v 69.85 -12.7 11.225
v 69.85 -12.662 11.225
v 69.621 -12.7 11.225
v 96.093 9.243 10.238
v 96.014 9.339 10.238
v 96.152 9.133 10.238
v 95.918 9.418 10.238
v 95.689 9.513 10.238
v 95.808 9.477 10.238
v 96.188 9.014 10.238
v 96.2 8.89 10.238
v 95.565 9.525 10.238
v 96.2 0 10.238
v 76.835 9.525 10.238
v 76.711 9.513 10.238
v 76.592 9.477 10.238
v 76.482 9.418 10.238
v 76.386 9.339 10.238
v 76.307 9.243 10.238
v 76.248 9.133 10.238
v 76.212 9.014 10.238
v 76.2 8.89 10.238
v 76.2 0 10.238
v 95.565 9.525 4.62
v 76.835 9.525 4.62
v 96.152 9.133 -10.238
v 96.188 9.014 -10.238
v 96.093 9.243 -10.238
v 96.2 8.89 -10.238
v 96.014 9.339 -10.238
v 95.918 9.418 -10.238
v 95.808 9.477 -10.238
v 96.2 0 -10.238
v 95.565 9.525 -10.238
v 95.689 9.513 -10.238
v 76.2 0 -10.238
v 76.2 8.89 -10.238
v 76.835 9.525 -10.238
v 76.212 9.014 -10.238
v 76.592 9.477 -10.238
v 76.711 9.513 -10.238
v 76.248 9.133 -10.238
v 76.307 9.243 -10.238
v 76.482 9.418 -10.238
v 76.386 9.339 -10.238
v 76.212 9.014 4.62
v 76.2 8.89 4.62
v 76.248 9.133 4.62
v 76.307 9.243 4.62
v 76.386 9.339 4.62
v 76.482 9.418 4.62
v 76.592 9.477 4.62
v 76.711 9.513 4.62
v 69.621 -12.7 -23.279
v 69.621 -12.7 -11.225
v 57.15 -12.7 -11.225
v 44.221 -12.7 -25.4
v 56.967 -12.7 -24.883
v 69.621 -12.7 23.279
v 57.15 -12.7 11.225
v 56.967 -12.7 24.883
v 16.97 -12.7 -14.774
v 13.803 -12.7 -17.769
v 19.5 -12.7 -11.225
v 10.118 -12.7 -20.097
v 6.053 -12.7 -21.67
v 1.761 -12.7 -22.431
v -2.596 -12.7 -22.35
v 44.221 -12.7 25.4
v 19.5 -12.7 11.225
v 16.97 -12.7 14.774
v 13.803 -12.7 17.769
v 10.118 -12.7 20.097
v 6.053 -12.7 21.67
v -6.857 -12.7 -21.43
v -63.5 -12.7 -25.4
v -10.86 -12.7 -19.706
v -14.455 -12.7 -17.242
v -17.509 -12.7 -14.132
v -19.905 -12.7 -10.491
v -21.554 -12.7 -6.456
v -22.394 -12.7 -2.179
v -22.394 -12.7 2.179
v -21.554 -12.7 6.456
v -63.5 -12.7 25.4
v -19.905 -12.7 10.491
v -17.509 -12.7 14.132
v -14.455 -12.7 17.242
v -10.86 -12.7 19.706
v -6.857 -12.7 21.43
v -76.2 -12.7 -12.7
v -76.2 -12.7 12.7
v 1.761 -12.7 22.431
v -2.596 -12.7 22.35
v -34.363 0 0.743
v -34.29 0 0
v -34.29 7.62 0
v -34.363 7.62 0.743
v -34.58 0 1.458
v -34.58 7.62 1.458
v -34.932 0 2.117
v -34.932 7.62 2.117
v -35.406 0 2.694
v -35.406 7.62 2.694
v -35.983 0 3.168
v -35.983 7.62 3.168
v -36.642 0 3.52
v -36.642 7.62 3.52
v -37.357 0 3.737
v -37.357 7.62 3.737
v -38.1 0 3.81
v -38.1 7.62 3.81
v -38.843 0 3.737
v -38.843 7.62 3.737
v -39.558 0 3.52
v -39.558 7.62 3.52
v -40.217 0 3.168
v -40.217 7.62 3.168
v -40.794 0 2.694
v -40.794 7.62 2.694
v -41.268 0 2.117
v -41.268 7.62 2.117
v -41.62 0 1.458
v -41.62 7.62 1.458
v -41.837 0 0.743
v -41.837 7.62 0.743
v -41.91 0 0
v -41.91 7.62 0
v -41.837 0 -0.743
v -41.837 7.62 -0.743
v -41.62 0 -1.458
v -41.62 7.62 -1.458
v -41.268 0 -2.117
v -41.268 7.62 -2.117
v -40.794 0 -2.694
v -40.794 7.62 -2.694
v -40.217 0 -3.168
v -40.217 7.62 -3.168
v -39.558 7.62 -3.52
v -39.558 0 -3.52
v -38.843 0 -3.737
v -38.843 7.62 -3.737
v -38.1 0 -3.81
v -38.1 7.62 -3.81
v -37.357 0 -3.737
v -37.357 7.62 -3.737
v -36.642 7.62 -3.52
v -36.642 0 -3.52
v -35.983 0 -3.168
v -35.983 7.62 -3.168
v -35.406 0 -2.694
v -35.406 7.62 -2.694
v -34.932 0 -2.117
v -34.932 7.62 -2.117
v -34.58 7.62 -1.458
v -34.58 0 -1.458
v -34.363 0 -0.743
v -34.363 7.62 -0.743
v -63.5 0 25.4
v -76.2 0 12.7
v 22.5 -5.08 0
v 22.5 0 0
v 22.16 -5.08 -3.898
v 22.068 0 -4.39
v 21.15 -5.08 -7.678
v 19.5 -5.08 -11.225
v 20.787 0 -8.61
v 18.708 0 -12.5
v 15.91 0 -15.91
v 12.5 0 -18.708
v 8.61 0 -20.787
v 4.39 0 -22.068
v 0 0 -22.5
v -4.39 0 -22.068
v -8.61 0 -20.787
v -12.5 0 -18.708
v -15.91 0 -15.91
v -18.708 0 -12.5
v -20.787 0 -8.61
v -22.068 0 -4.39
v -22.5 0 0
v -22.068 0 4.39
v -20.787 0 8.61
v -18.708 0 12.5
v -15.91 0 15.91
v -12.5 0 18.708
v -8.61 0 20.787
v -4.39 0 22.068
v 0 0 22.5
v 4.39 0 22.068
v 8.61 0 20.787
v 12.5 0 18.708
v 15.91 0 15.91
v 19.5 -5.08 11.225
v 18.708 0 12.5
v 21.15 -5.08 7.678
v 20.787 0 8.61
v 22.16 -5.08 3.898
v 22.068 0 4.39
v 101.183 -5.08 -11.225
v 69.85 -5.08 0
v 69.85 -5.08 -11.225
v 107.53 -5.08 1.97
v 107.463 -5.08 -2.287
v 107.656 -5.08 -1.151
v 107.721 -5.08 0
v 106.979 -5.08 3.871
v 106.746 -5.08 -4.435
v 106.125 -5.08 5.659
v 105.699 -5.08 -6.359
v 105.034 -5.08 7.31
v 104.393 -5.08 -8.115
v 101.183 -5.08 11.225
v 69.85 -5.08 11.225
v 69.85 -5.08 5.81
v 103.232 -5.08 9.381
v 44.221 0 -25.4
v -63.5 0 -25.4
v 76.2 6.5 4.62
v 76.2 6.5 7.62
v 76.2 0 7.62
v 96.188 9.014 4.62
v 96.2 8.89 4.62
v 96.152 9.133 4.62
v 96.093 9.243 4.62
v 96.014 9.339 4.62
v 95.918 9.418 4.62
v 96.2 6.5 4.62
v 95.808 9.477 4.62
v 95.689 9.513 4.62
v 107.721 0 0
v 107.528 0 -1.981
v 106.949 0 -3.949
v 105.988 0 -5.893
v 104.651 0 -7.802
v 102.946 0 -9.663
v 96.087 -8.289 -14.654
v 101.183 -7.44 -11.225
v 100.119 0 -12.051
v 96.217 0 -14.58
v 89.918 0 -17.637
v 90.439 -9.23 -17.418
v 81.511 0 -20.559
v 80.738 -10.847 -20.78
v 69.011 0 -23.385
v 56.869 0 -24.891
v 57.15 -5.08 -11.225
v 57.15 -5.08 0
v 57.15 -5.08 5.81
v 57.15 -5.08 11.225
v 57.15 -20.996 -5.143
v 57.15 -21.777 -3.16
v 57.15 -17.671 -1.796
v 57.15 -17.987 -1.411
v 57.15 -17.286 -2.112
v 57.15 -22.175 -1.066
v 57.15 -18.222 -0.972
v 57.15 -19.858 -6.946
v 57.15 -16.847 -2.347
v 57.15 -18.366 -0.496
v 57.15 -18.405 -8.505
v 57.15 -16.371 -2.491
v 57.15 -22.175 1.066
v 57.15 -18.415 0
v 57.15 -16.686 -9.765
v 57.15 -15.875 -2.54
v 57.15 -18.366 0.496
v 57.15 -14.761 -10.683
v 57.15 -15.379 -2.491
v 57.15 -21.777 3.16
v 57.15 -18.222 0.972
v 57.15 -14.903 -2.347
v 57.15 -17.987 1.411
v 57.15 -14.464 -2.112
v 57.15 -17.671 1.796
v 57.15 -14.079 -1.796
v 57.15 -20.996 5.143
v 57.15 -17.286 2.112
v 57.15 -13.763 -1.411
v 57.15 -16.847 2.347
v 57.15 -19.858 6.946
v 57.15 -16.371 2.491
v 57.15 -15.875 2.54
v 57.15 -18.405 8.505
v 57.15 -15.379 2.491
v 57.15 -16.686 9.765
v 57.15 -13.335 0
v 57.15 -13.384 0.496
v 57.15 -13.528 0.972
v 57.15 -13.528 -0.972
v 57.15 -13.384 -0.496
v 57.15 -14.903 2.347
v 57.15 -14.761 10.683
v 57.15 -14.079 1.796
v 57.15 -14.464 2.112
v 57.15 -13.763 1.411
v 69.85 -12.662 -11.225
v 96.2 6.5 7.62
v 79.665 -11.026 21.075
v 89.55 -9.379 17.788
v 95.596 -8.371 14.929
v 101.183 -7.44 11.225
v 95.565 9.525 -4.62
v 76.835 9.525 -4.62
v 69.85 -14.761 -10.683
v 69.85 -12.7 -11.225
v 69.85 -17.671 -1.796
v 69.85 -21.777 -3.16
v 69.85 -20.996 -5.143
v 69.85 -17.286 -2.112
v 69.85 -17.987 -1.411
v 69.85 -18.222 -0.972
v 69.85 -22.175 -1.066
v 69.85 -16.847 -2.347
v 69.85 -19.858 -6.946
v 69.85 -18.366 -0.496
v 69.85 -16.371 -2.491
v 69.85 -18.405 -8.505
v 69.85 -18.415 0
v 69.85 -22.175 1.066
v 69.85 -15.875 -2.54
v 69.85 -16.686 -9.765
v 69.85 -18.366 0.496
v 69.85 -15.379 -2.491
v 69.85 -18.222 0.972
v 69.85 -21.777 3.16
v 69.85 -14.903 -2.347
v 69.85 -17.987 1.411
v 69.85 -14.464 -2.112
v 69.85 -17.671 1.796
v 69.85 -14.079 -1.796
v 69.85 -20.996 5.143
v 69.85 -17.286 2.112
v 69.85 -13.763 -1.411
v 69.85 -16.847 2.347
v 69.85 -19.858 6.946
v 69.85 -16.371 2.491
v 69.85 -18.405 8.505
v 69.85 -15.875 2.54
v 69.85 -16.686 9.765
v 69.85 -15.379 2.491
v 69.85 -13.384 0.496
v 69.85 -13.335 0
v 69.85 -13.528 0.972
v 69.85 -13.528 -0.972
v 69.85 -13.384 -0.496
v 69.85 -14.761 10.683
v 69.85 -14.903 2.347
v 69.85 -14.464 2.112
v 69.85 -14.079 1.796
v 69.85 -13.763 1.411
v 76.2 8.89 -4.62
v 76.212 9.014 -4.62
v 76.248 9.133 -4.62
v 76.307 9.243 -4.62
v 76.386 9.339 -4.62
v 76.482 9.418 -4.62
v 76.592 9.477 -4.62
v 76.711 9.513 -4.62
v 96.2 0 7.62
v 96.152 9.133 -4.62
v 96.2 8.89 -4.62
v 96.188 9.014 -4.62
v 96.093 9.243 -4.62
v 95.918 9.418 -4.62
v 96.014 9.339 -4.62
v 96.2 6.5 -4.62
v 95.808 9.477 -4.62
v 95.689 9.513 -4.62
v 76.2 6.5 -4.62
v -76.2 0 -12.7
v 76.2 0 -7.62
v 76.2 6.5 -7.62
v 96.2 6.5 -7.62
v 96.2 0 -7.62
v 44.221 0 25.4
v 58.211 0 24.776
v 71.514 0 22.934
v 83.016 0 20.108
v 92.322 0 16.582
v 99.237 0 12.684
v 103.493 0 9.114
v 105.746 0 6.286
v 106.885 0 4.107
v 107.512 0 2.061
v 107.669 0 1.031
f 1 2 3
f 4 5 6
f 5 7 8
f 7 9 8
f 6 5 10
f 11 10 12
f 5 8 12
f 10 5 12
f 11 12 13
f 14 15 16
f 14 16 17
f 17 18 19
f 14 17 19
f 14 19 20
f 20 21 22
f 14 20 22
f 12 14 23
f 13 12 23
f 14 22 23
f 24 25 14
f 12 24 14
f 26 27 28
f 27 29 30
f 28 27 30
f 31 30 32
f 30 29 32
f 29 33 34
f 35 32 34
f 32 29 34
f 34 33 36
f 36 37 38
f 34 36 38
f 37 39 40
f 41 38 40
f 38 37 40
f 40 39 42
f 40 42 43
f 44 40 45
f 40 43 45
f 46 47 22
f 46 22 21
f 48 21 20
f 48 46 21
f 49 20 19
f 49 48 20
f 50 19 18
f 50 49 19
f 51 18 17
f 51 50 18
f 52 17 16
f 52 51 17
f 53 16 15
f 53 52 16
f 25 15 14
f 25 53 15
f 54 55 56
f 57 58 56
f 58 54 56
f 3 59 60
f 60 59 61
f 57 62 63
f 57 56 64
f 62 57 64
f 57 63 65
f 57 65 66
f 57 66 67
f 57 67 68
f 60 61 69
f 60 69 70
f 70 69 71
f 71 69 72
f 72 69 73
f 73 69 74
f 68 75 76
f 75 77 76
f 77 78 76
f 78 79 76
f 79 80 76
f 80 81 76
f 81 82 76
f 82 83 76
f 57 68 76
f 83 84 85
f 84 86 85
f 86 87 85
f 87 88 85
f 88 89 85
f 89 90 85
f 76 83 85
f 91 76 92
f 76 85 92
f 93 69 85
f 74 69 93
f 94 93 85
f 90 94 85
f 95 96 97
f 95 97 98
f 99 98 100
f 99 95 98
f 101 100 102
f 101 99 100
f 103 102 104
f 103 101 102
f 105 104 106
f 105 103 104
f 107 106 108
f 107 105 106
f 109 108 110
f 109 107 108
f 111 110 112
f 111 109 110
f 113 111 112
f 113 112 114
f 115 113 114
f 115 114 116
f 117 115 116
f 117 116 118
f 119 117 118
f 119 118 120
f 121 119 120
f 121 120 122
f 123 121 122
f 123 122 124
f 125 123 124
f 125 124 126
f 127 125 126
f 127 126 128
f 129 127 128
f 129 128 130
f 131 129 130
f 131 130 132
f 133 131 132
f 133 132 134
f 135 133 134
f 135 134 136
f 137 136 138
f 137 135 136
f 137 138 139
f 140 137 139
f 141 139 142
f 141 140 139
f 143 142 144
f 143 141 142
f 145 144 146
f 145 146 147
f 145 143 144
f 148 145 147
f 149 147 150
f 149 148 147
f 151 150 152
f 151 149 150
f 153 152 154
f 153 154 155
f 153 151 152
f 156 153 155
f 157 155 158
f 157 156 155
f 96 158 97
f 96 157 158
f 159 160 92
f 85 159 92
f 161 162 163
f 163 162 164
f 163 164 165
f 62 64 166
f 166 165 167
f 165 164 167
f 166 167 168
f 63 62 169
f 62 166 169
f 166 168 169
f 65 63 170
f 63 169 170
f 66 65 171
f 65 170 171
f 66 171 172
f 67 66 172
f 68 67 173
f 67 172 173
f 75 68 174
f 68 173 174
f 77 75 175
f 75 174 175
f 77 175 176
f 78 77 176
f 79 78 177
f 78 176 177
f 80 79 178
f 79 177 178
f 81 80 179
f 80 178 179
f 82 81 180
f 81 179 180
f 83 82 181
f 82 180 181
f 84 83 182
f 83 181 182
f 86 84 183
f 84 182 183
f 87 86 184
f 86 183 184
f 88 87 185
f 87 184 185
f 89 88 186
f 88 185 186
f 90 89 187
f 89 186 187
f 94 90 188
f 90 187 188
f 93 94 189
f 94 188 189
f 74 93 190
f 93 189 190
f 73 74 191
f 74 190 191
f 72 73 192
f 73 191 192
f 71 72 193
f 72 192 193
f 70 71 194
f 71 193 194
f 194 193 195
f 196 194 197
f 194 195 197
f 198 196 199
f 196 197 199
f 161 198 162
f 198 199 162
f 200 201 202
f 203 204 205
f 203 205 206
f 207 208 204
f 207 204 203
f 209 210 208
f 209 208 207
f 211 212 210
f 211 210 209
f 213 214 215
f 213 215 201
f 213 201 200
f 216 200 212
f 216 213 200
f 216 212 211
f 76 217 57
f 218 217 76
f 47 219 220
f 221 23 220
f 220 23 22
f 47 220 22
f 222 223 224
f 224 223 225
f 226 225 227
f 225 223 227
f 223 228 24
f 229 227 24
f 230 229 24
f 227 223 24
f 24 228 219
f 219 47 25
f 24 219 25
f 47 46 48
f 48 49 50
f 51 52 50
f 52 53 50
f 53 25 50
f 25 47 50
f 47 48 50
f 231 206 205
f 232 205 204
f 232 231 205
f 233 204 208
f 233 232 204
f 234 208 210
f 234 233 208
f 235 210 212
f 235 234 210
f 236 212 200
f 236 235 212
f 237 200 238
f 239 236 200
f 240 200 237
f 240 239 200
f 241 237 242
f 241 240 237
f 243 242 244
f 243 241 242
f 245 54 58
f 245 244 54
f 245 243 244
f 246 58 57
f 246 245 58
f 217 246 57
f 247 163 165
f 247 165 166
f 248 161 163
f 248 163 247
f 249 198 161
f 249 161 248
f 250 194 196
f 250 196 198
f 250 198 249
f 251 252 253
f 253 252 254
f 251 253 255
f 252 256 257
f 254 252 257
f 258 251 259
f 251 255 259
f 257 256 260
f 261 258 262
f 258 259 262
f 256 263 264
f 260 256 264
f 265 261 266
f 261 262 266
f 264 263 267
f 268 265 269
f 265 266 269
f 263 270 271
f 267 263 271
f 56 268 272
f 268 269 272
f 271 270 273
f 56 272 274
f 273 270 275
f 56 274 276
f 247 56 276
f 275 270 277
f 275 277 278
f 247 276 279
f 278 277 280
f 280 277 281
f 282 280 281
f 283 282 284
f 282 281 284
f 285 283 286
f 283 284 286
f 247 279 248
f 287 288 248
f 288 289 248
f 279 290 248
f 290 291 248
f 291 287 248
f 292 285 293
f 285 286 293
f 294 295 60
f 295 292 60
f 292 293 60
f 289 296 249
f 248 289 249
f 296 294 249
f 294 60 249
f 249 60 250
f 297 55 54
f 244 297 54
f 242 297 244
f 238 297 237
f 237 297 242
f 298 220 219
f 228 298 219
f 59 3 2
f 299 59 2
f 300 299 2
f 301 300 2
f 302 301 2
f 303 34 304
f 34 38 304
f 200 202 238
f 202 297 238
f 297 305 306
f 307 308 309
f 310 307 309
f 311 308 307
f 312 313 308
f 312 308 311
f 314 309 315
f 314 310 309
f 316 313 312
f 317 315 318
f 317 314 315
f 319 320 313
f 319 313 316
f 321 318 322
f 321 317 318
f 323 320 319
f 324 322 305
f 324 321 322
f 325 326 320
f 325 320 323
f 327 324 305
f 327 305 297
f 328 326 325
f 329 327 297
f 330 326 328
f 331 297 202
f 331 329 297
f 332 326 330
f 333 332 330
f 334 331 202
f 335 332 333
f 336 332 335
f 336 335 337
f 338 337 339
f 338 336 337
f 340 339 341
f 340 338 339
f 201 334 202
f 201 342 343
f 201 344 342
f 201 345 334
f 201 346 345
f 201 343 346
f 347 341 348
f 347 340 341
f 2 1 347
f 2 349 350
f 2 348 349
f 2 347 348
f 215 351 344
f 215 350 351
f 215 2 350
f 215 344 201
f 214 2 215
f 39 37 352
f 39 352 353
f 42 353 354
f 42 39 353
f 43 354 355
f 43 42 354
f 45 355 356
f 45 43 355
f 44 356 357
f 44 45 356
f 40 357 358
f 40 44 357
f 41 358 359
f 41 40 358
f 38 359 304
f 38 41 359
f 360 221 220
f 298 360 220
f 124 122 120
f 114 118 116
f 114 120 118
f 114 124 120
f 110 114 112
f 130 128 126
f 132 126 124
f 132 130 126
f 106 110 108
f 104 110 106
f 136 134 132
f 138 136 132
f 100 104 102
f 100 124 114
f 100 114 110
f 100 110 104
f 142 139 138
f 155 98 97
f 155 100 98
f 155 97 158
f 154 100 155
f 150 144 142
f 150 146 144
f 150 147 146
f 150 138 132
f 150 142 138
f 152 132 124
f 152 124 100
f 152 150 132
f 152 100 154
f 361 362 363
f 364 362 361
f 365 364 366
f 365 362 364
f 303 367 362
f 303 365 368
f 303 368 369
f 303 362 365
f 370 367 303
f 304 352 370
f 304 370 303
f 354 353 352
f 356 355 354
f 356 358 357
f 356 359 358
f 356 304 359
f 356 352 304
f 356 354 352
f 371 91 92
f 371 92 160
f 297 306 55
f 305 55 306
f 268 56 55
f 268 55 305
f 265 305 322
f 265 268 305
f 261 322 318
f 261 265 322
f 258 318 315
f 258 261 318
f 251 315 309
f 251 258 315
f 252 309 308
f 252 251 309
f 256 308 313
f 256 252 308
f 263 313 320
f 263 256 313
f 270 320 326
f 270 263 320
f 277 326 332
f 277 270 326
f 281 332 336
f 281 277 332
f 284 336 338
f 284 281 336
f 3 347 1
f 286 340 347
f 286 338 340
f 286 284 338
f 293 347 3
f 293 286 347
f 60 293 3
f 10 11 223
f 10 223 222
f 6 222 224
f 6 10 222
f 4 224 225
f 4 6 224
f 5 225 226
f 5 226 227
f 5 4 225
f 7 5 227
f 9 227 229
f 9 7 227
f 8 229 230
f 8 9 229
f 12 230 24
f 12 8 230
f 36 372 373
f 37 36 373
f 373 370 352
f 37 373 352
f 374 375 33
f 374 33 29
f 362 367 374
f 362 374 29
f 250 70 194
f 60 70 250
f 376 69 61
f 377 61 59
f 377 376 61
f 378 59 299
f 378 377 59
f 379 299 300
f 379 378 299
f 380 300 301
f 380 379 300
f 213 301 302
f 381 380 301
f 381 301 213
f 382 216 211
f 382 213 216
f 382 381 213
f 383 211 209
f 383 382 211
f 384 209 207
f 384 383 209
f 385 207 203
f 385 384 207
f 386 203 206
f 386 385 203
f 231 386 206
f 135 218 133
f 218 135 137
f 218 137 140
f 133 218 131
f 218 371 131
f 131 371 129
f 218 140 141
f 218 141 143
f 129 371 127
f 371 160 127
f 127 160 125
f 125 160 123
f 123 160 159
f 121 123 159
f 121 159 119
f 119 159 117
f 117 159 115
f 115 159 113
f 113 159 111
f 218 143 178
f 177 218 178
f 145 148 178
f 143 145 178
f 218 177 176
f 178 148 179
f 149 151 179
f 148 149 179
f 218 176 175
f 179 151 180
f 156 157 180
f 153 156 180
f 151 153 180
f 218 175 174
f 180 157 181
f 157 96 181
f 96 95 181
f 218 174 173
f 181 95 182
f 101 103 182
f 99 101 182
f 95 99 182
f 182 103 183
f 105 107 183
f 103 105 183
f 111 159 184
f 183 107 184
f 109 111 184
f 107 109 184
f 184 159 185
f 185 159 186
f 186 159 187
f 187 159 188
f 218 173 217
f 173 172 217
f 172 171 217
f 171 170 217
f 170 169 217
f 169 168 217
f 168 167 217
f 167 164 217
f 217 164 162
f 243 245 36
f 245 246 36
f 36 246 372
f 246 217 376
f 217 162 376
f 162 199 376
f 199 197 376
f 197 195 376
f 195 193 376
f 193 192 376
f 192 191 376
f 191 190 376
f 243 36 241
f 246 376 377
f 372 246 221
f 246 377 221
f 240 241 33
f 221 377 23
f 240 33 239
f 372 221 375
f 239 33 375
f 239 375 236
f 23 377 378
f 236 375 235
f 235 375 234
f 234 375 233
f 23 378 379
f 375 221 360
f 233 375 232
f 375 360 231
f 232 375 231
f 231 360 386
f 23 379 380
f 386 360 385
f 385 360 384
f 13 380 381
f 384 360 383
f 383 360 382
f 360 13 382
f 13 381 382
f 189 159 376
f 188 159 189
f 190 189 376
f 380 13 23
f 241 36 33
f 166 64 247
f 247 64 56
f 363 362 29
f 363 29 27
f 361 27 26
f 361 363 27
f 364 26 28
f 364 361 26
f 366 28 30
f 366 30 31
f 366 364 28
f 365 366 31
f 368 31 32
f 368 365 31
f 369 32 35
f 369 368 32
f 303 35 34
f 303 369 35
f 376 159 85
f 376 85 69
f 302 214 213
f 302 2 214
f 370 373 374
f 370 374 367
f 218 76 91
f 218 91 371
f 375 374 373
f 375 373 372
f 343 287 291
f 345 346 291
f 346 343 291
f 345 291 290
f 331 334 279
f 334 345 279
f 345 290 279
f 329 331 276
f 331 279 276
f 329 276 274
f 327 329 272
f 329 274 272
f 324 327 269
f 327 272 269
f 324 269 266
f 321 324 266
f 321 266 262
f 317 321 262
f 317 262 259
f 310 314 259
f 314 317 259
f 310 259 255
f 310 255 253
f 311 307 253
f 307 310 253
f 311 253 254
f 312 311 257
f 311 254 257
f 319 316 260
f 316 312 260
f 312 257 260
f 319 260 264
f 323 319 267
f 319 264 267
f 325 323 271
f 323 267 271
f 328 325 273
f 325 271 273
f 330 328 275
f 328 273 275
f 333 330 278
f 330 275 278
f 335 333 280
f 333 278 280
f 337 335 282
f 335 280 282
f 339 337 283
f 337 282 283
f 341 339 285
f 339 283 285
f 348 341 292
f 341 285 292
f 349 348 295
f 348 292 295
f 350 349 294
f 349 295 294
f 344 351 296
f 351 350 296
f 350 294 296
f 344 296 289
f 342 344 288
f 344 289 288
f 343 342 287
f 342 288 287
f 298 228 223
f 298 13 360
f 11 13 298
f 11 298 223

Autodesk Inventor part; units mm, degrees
ref_plane "XZ Plane" through (0, 0, 0) normal (0, 1, 0) x (-1, 0, 0)
sketch "Sketch1" plane through (0, 0, 0) normal (0, 0, 1) x (1, 0, 0)
  line L0 (107.721093, 0) -> (-76.2, 0)
  line L1 (-76.2, 0) -> (-76.2, -12.7)
  line L2 (-76.2, -12.7) -> (69.621093, -12.700026)
  line L3 (107.721093, -6.350016) -> (107.721093, 0)
  line L4 (107.721093, -6.350016) -> (69.621093, -12.700026)
  point P0 (0, 0)
  dimension "d19" = 183.92109
  dimension "d20" = 76.2
  dimension "d21" = 12.7
  dimension "d22" = 38.1
extrude "Extrusion2" add sketch "Sketch1" along normal blind 25.4
sketch "Sketch2" plane through (-76.2, 0, 0) normal (0, 1, 0) x (1, 0, 0)
  circle A0 centre (76.2, 0) radius 22.5
  dimension "d25" = 45
extrude "Extrusion3" cut sketch "Sketch2" against normal through all
mirror "Mirror1" about plane through (14.352169, -5.990033, 0) normal (0, 0, -1) of "Extrusion2", "Extrusion3"
sketch "Sketch4" plane through (-76.2, 0, 25.4) normal (0, 1, 0) x (1, 0, 0)
  circle A0 centre (38.1, 25.4) radius 3.81
  line L0 (-36.784219, 25.4) -> (220.705311, 25.4)
  point P0 (76.2, 25.4)
  dimension "d13" = 7.62
  dimension "d39" = 38.1
extrude "Extrusion5" add sketch "Sketch4" along normal blind 7.62
ref_plane "Work Plane1" through (76.2, 0, 0) normal (1, 0, 0) x (0, 1, 0)
sketch "Sketch10" plane through (69.621093, -12.700026, -25.4) normal (-0.0000002, -1, 0) x (1, -0.0000002, 0)
  line L0 (-69.621095, 36.62532) -> (38.099999, 36.62532)
  line L1 (-69.621095, 14.17468) -> (38.1, 14.17468)
  circle A0 centre (-69.621095, 25.4) radius 11.22532
  line L2 (-69.621095, 36.62532) -> (-69.621095, 14.17468) construction
  line L3 (38.099999, 0) -> (38.099999, 50.8) construction
  line L4 (38.099999, 36.62532) -> (38.1, 14.17468)
  point P0 (-69.621095, 25.4)
extrude "Extrusion11" cut sketch "Sketch10" against normal mid plane 15.24
ref_plane "Work Plane4" through (63.5, 0, 0) normal (1, 0, 0) x (0, 1, 0)
sketch "Sketch5" plane through (76.2, 0, 0) normal (1, 0, 0) x (0, 1, 0)
  line L0 (-1.5875, -10.237854) -> (9.525, -10.237854)
  line L1 (9.525, -10.237854) -> (9.525, 10.237854)
  line L2 (9.525, 10.237854) -> (-1.5875, 10.237854)
  line L3 (-1.5875, 10.237854) -> (-1.5875, -10.237854)
  line L4 (9.525, -7.62) -> (0, -7.62)
  line L5 (0, -7.62) -> (0, 7.62)
  line L6 (0, 7.62) -> (9.525, 7.62)
  line L7 (9.525, 7.62) -> (9.525, -7.62)
  line L8 (0, 25.4) -> (0, -25.4)
  line L9 (9.525, -7.62) -> (6.5, -7.62)
  line L10 (6.5, -7.62) -> (6.5, -4.62)
  line L11 (6.5, -4.62) -> (9.525, -4.62)
  line L12 (9.525, -4.62) -> (9.525, -7.62)
  line L13 (9.525, 7.62) -> (6.5, 7.62)
  line L14 (6.5, 7.62) -> (6.5, 4.62)
  line L15 (6.5, 4.62) -> (9.525, 4.62)
  line L16 (9.525, 4.62) -> (9.525, 7.62)
  point P0 (0, 0)
  point P1 (0, 0)
  point P2 (9.525, 0)
  dimension "d14" = 15.24
  dimension "d50" = 6.5
  dimension "d51" = 3
  dimension "d52" = 3
extrude "Extrusion6" add sketch "Sketch5" along normal blind 20 contours L3 L2 L8 L5 L0 | L8 L4 L1 L0 | L2 L1 L6 L8 | L4 L10 L11 L1 | L6 L1 L15 L14
fillet "Fillet1" radius 0.635 4 edges at (96.2, 9.525, 7.4289) (76.2, 9.525, 7.4289) (76.2, 9.525, -7.4289) (96.2, 9.525, -7.4289)
chamfer "Chamfer1" distance 12.7 angle 45 2 edges at (-76.2, -6.35, -25.4) (-76.2, -6.35, 25.4)
sketch "Sketch11" plane through (63.5, 0, 0) normal (1, 0, 0) x (0, 1, 0)
  line L0 (-5.080017, 11.22532) -> (-12.700026, 11.22532)
  ellipse E0 centre (-5.080014, 0) end of major axis (-5.080014, -22.5) minor radius 0.000004 (-5.080017, 11.22532) -> (-5.080017, -11.22532) ccw
  line L1 (-12.700026, -11.22532) -> (-5.080017, -11.22532)
  line L2 (-12.700026, 11.22532) -> (-6.350016, 11.22532)
  line L3 (-6.350016, 11.22532) -> (-5.080033, 11.22532)
  line L4 (-5.080033, 11.22532) -> (-5.080033, -11.22532)
  line L5 (-6.350016, -11.22532) -> (-12.700026, -11.22532)
  arc A0 (-12.700026, 11.22532) -> (-12.700026, -11.22532) centre (-10.847911, 0) ccw
  circle A1 centre (-15.875014, 0) radius 2.54
  ellipse E1 centre (-12.700014, 0) end of major axis (-12.700014, 22.5) minor radius 0.000004 (-12.700026, -11.22532) -> (-12.700026, 11.22532) ccw
  point P0 (0, 0)
  dimension "d48" = 3.175
  dimension "d49" = 5.08
extrude "Extrusion12" add sketch "Sketch11" along normal mid plane 12.7
sketch "Sketch12" plane through (107.721093, 0, 25.4) normal (0, 1, 0) x (1, 0, 0)
  line L0 (-171.221093, 50.8) -> (0, 50.8)
  line L1 (0, 0) -> (0, 50.8)
  line L2 (-171.221093, 0) -> (0, 0)
  line L3 (0, 25.4) -> (-107.721093, 25.4) construction
  ellipse E0 centre (-63.5, 25.4) end of major axis (0, 25.4) minor radius 25.4 (-63.5, 0) -> (-63.5, 50.8) ccw
extrude "Extrusion13" cut sketch "Sketch12" against normal through all
properties part number "Guide" material "UHMW, Black"
